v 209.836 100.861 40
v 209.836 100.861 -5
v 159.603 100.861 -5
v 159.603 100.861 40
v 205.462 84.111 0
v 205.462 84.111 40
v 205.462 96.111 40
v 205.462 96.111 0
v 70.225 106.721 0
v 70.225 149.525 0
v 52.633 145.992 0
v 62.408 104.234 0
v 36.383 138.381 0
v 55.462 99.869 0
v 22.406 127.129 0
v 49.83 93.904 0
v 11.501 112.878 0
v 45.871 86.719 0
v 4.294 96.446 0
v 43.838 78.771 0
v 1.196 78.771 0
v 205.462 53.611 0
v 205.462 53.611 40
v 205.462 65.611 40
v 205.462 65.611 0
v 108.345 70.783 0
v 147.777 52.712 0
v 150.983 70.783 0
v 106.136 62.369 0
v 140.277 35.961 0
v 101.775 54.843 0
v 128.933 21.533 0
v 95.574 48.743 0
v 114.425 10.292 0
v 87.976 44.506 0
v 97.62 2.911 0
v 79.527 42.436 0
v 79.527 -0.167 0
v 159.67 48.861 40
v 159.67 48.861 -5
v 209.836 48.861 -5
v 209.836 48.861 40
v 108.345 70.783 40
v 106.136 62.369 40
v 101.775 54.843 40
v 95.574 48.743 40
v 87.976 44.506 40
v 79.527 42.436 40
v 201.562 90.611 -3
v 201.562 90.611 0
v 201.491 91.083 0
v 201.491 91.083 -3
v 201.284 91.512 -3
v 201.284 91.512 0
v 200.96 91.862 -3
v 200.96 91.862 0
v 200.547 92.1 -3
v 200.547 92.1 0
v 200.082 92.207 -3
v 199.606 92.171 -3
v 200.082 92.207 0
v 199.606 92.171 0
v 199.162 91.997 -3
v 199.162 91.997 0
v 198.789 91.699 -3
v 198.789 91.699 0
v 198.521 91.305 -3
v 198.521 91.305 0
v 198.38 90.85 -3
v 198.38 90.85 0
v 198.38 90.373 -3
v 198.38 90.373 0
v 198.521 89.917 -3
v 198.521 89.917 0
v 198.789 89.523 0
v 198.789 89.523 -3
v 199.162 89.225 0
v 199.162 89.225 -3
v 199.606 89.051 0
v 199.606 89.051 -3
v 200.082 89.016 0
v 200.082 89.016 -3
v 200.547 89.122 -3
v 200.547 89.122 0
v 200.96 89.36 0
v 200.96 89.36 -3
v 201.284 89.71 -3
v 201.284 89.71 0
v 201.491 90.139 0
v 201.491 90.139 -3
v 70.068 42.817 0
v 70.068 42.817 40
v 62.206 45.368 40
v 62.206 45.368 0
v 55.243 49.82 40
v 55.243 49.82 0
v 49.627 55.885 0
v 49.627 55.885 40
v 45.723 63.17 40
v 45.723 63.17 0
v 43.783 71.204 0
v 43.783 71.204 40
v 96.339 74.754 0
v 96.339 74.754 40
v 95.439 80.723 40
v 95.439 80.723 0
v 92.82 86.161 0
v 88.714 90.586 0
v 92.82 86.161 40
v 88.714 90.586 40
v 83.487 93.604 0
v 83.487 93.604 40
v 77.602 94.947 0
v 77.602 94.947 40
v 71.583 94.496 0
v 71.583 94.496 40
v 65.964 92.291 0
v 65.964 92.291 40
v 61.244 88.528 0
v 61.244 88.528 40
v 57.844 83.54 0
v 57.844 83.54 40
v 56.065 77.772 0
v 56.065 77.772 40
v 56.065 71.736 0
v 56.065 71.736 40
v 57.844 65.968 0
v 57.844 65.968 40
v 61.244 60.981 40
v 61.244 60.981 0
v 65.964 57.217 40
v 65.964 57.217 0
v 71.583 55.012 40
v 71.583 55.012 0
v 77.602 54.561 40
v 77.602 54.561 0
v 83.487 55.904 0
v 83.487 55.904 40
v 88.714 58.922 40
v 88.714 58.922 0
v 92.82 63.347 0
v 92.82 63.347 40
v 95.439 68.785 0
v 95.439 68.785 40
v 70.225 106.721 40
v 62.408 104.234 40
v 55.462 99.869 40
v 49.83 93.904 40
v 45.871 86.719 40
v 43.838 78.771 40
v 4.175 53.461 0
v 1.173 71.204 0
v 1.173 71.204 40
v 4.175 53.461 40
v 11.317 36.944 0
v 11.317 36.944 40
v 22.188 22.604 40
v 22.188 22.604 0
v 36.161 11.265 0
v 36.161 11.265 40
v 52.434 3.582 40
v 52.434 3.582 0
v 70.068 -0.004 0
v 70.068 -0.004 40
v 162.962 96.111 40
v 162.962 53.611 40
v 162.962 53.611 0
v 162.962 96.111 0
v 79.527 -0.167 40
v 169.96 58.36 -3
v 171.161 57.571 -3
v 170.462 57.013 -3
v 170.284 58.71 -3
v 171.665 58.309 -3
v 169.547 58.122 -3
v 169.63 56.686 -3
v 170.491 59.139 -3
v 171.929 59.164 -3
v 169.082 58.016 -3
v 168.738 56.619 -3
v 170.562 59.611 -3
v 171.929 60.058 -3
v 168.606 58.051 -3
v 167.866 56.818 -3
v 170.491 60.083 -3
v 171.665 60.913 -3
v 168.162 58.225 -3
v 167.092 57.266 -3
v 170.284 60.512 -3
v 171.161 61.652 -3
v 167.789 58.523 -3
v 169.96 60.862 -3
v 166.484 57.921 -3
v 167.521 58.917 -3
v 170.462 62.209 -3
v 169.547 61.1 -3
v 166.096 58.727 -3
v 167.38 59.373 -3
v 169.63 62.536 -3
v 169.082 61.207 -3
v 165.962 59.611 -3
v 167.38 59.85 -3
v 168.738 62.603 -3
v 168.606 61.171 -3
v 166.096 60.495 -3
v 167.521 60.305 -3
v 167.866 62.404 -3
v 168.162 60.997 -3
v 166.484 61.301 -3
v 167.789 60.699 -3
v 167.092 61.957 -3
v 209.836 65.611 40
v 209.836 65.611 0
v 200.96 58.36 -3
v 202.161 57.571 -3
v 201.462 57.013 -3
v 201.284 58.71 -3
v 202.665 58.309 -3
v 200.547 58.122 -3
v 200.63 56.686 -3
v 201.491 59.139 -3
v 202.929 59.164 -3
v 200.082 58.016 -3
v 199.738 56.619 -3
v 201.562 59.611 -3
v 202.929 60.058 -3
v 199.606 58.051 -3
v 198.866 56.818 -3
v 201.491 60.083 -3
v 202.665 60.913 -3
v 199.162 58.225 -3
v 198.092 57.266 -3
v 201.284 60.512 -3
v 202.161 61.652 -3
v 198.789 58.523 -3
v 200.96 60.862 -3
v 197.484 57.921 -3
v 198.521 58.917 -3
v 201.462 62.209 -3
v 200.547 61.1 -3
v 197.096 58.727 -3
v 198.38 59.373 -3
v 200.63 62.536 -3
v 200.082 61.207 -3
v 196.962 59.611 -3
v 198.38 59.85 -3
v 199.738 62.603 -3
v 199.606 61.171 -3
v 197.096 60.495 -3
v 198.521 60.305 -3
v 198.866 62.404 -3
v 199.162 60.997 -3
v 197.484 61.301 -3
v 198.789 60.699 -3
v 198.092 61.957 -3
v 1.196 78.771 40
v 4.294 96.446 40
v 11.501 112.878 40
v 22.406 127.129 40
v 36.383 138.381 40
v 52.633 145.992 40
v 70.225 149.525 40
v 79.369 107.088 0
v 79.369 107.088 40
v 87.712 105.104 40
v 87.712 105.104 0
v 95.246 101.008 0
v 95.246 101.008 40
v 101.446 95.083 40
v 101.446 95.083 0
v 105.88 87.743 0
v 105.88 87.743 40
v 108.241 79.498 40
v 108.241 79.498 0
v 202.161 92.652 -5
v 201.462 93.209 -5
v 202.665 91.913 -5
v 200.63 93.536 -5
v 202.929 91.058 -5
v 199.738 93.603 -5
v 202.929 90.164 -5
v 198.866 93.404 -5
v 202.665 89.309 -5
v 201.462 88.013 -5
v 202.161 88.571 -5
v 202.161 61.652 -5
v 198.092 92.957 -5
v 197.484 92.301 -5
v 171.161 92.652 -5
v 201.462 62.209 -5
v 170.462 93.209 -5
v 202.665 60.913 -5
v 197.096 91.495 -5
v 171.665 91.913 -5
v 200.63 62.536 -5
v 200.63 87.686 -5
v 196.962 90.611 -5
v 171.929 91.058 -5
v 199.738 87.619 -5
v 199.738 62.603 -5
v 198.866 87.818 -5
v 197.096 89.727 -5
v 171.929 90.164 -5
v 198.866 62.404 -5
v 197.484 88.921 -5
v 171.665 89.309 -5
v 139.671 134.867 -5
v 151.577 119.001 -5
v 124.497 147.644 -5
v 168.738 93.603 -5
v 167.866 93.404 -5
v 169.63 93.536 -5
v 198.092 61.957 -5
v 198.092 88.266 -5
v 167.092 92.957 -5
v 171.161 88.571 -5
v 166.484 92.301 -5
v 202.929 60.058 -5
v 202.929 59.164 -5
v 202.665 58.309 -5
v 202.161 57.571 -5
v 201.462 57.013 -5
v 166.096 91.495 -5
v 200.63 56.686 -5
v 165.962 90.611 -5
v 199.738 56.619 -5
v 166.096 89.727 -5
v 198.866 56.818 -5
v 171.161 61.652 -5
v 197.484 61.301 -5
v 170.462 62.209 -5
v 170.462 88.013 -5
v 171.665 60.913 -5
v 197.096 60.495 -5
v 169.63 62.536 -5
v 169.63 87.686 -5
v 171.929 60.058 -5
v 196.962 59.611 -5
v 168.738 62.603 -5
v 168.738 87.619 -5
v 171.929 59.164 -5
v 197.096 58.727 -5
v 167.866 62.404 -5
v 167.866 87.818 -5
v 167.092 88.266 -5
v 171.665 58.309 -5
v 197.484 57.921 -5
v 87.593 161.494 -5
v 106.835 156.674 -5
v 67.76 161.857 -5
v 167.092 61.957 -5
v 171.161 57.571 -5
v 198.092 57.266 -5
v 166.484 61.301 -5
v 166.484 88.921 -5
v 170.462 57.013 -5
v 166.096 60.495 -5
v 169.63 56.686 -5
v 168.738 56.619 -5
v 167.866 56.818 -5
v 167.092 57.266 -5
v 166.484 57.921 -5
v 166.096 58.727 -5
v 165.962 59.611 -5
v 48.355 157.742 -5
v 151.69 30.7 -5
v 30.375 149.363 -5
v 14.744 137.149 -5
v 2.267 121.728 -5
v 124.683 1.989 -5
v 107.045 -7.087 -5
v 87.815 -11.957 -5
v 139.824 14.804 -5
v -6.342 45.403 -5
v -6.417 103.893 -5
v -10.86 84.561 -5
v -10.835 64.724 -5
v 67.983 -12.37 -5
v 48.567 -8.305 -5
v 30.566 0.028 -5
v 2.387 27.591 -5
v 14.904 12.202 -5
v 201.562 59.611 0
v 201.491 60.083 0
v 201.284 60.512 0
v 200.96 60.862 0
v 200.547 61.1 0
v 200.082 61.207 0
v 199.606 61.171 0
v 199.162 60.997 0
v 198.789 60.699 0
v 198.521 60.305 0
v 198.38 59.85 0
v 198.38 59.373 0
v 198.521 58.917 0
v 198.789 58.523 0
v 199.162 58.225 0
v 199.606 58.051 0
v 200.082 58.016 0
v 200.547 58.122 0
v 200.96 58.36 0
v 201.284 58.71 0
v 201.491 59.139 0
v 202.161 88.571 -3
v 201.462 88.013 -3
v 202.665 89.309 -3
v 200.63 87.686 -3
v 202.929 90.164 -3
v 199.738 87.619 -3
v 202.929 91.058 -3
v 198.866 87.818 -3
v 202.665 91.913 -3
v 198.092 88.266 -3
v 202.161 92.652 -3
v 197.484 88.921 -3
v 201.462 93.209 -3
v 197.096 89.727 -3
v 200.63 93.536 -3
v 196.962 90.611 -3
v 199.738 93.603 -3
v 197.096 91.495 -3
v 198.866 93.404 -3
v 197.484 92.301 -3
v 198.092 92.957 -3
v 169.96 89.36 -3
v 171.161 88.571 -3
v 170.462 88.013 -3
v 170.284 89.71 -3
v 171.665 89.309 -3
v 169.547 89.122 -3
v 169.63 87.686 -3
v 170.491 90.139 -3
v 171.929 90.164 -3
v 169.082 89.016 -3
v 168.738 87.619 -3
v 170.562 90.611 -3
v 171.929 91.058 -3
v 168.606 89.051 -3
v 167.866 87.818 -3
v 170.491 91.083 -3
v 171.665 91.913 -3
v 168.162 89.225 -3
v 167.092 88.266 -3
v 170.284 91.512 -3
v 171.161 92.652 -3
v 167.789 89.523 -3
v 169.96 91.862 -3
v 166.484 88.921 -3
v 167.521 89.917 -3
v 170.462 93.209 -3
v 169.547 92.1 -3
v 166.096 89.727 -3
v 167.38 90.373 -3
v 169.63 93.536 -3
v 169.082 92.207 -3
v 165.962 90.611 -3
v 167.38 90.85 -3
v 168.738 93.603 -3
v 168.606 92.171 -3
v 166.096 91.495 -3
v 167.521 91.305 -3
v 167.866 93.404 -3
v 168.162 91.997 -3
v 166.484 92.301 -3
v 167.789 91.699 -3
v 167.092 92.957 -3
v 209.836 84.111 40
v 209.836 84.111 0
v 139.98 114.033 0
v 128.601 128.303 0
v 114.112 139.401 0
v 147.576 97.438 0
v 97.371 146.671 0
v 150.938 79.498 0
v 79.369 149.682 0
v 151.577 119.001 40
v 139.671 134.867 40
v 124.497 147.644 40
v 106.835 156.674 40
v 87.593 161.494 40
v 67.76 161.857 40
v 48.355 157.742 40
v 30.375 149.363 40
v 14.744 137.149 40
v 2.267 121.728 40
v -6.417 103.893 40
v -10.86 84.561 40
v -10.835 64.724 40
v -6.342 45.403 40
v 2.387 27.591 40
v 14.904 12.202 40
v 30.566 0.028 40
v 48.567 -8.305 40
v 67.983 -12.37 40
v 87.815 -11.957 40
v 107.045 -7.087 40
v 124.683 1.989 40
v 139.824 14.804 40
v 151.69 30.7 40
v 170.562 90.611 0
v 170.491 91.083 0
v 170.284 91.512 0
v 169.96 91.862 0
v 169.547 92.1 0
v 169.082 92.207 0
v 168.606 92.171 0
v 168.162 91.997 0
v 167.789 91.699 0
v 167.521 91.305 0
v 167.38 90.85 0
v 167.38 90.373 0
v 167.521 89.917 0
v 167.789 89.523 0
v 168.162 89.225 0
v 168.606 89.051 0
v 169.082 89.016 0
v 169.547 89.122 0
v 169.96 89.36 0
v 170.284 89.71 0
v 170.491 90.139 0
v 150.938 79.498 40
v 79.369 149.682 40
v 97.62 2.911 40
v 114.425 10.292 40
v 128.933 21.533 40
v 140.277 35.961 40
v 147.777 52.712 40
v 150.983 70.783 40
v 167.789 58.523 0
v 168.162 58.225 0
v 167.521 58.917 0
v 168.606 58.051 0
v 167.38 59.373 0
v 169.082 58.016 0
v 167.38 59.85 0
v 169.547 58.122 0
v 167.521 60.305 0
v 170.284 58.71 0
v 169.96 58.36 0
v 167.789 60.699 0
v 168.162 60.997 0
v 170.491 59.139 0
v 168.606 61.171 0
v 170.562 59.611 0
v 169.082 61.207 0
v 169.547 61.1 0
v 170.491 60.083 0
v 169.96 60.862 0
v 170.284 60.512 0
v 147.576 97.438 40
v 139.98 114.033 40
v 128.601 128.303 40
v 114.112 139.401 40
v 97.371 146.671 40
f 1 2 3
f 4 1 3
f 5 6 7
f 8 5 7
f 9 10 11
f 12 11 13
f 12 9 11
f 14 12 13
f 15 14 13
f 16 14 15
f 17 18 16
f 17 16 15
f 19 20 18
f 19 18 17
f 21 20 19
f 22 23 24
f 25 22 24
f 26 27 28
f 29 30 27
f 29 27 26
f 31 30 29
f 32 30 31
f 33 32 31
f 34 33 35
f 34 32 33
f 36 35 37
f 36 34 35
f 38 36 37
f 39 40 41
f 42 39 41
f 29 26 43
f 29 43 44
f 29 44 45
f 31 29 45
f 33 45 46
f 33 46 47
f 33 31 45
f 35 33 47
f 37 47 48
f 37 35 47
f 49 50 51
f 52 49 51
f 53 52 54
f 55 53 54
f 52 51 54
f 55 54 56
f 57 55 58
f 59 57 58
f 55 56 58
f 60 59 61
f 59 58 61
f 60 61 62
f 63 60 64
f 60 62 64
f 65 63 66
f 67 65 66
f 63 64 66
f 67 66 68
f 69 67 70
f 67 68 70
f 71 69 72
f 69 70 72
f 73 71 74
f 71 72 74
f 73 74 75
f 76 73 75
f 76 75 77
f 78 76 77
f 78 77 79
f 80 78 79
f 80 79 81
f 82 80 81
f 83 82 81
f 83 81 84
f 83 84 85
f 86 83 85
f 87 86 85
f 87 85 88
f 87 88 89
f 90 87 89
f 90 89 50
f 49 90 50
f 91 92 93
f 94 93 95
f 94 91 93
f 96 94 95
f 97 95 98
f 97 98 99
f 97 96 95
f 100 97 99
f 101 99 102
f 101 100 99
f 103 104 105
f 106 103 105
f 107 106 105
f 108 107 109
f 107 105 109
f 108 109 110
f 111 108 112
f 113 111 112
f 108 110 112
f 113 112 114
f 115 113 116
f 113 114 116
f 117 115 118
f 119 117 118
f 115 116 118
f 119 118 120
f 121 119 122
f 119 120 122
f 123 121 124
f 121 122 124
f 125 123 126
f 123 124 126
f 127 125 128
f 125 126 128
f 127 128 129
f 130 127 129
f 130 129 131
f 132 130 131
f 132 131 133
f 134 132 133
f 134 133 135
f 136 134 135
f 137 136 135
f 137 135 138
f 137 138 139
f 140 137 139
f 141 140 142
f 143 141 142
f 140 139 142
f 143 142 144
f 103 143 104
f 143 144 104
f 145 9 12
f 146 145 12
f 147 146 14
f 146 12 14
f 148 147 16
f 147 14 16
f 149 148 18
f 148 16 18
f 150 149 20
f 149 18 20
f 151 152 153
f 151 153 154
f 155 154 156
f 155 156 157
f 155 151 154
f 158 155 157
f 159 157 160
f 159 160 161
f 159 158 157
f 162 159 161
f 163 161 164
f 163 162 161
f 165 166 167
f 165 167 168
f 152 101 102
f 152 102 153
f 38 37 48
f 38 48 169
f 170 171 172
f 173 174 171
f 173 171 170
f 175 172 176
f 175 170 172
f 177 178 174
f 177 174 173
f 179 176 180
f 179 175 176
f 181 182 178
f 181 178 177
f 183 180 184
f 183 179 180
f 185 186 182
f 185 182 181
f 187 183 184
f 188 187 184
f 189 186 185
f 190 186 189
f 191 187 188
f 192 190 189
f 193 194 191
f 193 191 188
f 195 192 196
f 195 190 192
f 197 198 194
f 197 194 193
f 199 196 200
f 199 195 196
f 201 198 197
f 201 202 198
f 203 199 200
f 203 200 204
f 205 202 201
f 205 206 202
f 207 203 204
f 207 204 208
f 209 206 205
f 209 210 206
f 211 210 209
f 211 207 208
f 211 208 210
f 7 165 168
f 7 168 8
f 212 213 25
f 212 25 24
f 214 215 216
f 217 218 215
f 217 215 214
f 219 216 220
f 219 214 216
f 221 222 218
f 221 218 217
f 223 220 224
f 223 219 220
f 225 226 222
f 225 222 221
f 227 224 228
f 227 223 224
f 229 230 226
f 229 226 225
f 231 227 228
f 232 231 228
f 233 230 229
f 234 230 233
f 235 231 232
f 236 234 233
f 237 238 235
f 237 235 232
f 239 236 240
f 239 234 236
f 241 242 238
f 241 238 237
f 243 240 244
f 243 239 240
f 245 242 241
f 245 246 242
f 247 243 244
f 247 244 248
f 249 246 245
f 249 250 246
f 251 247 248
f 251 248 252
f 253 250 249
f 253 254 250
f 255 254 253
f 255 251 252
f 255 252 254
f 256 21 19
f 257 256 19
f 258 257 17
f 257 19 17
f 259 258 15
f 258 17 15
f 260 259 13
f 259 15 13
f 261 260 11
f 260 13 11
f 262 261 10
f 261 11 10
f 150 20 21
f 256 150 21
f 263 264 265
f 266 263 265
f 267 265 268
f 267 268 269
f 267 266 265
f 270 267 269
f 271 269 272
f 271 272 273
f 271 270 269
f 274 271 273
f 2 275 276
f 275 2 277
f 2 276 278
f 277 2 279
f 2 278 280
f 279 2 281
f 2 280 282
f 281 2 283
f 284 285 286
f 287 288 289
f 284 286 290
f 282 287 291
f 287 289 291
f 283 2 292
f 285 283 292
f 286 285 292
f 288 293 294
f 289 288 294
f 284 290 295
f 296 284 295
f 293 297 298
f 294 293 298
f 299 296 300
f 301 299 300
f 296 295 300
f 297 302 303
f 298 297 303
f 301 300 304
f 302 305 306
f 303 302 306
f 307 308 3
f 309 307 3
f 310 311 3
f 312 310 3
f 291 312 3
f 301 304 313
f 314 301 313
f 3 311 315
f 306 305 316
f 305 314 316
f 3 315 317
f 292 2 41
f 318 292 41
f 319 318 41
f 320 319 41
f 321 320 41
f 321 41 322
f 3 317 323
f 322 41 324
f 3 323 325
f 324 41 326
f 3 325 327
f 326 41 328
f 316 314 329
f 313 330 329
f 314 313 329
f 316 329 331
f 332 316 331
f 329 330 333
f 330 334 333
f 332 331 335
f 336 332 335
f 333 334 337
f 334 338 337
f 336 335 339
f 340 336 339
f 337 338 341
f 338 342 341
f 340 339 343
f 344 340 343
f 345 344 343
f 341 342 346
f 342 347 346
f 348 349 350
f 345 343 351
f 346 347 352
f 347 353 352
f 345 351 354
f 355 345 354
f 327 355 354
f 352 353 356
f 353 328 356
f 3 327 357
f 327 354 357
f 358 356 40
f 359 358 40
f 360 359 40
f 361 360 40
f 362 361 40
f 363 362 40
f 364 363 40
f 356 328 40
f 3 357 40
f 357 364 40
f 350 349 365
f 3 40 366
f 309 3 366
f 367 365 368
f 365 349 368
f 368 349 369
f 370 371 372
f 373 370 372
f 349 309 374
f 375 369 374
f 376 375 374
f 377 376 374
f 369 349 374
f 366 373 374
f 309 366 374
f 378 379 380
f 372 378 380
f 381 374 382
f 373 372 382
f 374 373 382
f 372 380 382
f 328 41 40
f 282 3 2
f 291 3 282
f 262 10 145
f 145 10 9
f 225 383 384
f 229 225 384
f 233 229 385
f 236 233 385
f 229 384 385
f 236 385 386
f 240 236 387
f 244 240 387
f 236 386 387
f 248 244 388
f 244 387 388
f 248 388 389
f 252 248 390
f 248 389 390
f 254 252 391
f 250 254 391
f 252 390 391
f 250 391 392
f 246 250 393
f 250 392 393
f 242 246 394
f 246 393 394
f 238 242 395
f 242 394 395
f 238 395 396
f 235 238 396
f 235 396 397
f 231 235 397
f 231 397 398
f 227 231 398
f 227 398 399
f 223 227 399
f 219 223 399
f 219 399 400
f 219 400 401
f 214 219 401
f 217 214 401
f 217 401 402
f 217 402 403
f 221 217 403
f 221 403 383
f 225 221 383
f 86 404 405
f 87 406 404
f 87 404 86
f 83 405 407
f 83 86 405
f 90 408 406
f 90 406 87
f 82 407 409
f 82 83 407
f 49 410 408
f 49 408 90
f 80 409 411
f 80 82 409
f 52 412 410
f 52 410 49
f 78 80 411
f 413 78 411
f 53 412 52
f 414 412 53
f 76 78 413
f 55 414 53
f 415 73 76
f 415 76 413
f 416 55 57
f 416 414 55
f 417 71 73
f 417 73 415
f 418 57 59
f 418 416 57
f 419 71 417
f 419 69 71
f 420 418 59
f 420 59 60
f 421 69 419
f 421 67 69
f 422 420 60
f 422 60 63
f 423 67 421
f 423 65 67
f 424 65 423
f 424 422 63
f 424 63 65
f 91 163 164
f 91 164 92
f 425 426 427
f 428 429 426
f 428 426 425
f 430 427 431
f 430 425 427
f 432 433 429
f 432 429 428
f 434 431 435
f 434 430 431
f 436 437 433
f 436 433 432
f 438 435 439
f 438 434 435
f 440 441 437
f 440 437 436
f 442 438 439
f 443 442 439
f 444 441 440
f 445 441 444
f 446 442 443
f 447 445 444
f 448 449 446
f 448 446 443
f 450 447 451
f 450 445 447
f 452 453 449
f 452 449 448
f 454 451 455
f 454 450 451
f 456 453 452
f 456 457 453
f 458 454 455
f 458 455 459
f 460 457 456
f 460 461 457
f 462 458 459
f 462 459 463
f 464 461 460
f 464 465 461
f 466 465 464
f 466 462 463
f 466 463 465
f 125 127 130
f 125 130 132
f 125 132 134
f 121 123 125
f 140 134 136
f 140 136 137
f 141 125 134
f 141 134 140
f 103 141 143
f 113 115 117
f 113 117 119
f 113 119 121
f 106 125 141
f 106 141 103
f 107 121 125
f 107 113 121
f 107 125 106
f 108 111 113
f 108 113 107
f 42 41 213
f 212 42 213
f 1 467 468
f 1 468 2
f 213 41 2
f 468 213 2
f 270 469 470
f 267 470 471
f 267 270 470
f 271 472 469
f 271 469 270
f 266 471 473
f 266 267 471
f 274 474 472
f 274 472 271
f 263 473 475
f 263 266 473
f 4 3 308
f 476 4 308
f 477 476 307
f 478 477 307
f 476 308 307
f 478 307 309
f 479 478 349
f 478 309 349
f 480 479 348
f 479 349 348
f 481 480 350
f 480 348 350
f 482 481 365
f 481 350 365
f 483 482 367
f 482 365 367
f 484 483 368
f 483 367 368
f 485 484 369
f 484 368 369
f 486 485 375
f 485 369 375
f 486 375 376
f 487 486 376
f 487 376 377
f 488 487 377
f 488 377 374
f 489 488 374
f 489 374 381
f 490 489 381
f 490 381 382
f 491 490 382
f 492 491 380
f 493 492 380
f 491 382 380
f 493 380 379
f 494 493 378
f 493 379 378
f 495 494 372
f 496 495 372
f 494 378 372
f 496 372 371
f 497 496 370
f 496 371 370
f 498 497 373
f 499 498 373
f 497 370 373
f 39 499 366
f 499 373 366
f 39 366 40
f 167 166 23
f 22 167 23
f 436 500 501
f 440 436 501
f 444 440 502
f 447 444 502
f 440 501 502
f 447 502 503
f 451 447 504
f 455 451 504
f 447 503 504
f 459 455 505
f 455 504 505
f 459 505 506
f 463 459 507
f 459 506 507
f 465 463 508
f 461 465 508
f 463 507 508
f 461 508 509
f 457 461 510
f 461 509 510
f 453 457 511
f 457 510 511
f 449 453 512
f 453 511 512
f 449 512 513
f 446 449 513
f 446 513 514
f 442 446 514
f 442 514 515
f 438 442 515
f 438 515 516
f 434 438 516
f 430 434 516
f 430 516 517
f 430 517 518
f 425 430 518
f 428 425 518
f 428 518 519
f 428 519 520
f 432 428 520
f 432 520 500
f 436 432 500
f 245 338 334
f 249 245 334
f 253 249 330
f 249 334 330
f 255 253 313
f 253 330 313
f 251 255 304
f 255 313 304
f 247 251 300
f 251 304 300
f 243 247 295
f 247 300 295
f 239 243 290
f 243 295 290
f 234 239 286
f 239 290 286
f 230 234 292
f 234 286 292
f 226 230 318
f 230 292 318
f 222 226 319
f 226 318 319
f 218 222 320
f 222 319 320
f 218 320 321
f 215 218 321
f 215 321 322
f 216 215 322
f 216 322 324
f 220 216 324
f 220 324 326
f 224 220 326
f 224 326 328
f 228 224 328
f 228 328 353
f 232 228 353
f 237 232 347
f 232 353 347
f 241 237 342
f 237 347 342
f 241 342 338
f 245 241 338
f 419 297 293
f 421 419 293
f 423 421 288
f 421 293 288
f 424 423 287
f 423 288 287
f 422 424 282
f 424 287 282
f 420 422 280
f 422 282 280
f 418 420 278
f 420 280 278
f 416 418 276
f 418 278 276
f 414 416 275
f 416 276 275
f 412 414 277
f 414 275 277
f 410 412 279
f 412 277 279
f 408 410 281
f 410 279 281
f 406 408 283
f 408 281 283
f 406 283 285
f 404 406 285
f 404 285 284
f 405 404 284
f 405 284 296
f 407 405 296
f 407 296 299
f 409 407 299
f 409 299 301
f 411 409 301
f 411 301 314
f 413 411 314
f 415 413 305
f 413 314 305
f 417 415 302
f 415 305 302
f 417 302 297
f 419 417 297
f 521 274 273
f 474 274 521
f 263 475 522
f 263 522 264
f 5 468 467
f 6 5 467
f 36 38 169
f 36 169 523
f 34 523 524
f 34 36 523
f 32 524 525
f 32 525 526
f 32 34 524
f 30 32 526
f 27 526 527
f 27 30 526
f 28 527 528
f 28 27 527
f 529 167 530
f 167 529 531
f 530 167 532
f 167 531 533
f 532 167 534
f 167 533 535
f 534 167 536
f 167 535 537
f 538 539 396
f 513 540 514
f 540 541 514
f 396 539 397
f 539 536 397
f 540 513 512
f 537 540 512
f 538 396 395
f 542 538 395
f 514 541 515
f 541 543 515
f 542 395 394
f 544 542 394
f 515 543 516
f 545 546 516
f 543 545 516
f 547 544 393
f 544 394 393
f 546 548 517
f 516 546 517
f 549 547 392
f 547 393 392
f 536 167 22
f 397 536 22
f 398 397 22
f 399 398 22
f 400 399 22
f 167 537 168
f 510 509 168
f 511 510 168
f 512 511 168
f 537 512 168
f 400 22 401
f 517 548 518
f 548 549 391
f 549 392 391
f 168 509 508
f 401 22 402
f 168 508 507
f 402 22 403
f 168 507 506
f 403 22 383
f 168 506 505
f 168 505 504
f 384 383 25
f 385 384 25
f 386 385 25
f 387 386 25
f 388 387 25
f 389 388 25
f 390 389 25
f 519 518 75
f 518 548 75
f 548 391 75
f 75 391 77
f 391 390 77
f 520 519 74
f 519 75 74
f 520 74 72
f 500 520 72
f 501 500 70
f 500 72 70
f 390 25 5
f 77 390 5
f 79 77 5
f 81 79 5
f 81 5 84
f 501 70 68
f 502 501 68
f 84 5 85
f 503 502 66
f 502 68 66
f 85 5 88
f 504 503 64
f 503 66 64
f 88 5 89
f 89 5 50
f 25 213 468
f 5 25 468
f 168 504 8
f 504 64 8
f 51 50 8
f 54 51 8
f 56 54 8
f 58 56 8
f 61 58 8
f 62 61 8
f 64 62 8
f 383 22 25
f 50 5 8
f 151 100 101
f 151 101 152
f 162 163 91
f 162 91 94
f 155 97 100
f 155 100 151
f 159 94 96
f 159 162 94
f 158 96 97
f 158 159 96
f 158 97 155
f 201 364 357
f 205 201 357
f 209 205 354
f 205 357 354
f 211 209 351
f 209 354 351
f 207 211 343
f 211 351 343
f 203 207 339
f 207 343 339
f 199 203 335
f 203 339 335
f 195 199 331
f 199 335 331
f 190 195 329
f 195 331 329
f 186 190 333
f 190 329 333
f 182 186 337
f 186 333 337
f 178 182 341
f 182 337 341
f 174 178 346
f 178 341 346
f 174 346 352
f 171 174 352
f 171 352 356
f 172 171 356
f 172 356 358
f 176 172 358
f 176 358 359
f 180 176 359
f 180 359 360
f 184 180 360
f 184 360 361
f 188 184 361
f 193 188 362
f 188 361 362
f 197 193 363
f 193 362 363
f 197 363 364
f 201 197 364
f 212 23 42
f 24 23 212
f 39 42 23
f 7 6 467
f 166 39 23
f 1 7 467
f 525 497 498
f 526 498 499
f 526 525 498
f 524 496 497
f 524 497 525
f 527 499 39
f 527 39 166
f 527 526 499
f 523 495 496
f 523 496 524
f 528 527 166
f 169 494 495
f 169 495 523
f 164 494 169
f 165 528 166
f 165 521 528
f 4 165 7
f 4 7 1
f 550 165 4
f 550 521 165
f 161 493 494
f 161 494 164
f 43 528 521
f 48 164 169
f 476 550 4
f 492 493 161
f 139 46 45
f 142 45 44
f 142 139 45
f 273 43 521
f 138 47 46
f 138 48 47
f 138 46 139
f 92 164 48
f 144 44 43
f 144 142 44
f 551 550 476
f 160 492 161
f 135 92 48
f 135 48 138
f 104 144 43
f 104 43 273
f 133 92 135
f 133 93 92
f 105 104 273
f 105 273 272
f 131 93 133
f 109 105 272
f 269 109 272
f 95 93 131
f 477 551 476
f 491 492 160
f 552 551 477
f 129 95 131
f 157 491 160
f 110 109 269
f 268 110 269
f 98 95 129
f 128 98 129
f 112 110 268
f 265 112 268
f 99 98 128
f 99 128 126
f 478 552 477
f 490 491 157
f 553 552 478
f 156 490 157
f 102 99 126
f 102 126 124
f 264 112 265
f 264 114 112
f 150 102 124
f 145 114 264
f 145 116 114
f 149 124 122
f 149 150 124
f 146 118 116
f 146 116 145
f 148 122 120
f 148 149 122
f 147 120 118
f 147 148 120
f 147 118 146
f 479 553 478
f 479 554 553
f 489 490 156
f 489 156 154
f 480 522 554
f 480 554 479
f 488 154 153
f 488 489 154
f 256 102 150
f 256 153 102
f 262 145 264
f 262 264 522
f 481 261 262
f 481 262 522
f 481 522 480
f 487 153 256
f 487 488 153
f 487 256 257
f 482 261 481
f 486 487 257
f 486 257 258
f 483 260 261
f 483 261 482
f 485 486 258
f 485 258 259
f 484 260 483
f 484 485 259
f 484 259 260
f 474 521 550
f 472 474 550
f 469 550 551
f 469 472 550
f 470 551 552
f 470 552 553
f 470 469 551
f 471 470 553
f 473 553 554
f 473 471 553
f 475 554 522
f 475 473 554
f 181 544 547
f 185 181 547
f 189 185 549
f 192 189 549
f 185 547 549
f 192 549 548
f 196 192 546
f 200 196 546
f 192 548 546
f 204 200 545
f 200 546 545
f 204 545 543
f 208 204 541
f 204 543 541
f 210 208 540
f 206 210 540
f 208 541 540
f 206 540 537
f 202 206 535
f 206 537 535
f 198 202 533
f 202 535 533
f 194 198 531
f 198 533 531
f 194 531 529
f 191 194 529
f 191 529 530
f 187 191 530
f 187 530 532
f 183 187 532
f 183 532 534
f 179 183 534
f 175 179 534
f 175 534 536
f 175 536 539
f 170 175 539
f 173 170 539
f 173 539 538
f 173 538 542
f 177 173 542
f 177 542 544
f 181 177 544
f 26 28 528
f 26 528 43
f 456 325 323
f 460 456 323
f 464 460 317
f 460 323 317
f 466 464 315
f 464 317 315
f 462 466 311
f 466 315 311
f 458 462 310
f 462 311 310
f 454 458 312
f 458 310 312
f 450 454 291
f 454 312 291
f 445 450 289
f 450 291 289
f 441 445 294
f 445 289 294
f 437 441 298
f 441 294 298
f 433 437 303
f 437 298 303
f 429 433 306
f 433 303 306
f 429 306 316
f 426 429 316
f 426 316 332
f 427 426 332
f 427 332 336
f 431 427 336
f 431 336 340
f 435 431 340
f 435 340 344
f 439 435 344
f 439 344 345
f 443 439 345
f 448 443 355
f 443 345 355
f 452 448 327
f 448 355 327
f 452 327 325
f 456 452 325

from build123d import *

# Parameters (mm, degrees)
SKETCH1_R           = 20
BOSS_EXTRUDE4_DEPTH = 40
BOSS_EXTRUDE5_START = 5
BOSS_EXTRUDE5_DEPTH = 5
SKETCH6_R           = 1.25
CUT_EXTRUDE1_DEPTH  = 5
SKETCH7_R           = 3
CUT_EXTRUDE2_DEPTH  = 2
SKETCH8_R           = 20.25
CUT_EXTRUDE3_DEPTH  = 40
SKETCH9_W           = 42.5
SKETCH9_H           = 42.5
CUT_EXTRUDE4_DEPTH  = 40
SKETCH10_W          = 18.5
SKETCH10_H          = 40
CUT_EXTRUDE5_DEPTH  = 7
SKETCH11_R          = 1.6
CUT_EXTRUDE6_DEPTH  = 269.248997311


with BuildPart() as part:
    # Sketch1 → Boss-Extrude4 (new body)
    with BuildSketch(Plane(origin=(0, 0, 0), x_dir=(0, 1, 0), z_dir=(0, 0, 1))):
        with BuildLine():
            Line((48.86109499, -159.669791534), (48.86109499, -209.83599005))
            Line((48.86109499, -209.83599005), (65.86109499, -209.83599005))
            Line((65.86109499, -209.83599005), (65.86109499, -204.83599005))
            Line((65.86109499, -204.83599005), (53.86109499, -204.83599005))
            Line((53.86109499, -204.83599005), (53.86109499, -163.588668859))
            Line((53.86109499, -163.588668859), (95.86109499, -163.588668859))
            Line((95.86109499, -163.588668859), (95.86109499, -204.83599005))
            Line((95.86109499, -204.83599005), (83.86109499, -204.83599005))
            Line((83.86109499, -204.83599005), (83.86109499, -209.83599005))
            Line((83.86109499, -209.83599005), (100.86109499, -209.83599005))
            Line((100.86109499, -209.83599005), (100.86109499, -159.603176712))
            ThreePointArc((100.86109499, -159.603176712), (74.64197355, 11.411259343), (48.86109499, -159.669791534))
        make_face()
        with Locations(Location((74.754065705, -76.088668859, 0), (0, 0, 270))):
            Circle(SKETCH1_R, mode=Mode.SUBTRACT)
        with BuildLine():
            Line((149.524530838, -70.225432227), (106.720805548, -70.225432227))
            ThreePointArc((106.720805548, -70.225432227), (97.065220712, -52.456860586), (78.771338454, -43.837908873))
            Line((78.771338454, -43.837908873), (78.771338454, -1.19633601))
            ThreePointArc((78.771338454, -1.19633601), (127.128973259, -22.405626297), (149.524530838, -70.225432227))
        make_face(mode=Mode.SUBTRACT)
        with BuildLine():
            Line((149.682278397, -79.369361301), (107.088057991, -79.369361301))
            ThreePointArc((107.088057991, -79.369361301), (98.250620194, -98.542219295), (79.498497507, -108.240501884))
            Line((79.498497507, -108.240501884), (79.498497507, -150.938454209))
            ThreePointArc((79.498497507, -150.938454209), (128.302794309, -128.600892817), (149.682278397, -79.369361301))
        make_face(mode=Mode.SUBTRACT)
        with BuildLine():
            Line((70.783231418, -150.983478259), (70.783231418, -108.345179443))
            ThreePointArc((70.783231418, -108.345179443), (51.584378521, -98.879359849), (42.436457903, -79.52701525))
            Line((42.436457903, -79.52701525), (-0.167078, -79.52701525))
            ThreePointArc((-0.167078, -79.52701525), (21.532899104, -128.932849482), (70.783231418, -150.983478259))
        make_face(mode=Mode.SUBTRACT)
        with BuildLine():
            Line((-0.003869503, -70.067778277), (42.816644448, -70.067778277))
            ThreePointArc((42.816644448, -70.067778277), (52.673264417, -52.241484236), (71.203948876, -43.783148116))
            Line((71.203948876, -43.783148116), (71.203948876, -1.172738174))
            ThreePointArc((71.203948876, -1.172738174), (22.603616127, -22.187550051), (-0.003869503, -70.067778277))
        make_face(mode=Mode.SUBTRACT)
    extrude(amount=BOSS_EXTRUDE4_DEPTH)

    # Sketch4 → Boss-Extrude5 (add)
    with BuildSketch(Plane(origin=(0, 0, 0), x_dir=(1, 0, 0), z_dir=(0, 0, -1)).offset(BOSS_EXTRUDE5_START)):
        with BuildLine():
            Line((159.669791534, -48.86109499), (209.83599005, -48.86109499))
            Line((209.83599005, -48.86109499), (209.83599005, -100.86109499))
            Line((209.83599005, -100.86109499), (159.603176712, -100.86109499))
            ThreePointArc((159.603176712, -100.86109499), (-11.411259343, -74.64197355), (159.669791534, -48.86109499))
        make_face()
    extrude(amount=-BOSS_EXTRUDE5_DEPTH)

    # Sketch6 → Cut-Extrude1 (cut)
    with BuildSketch(Plane(origin=(0, 0, -5), x_dir=(1, 0, 0), z_dir=(0, 0, -1))):
        with Locations(Location((199.962329455, -59.61109499, 0), (0, 0, 180))):
            Circle(SKETCH6_R)
        with Locations(Location((168.962329455, -59.61109499, 0), (0, 0, 180))):
            Circle(SKETCH6_R)
        with Locations(Location((168.962329455, -90.61109499, 0), (0, 0, 180))):
            Circle(SKETCH6_R)
        with Locations(Location((199.962329455, -90.61109499, 0), (0, 0, 180))):
            Circle(SKETCH6_R)
    extrude(amount=-CUT_EXTRUDE1_DEPTH, mode=Mode.SUBTRACT)

    # Sketch7 → Cut-Extrude2 (cut)
    with BuildSketch(Plane(origin=(0, 0, -5), x_dir=(-1, 0, 0), z_dir=(0, 0, -1))):
        with Locations((-199.962329455, 59.61109499)):
            Circle(SKETCH7_R)
        with Locations((-168.962329455, 59.61109499)):
            Circle(SKETCH7_R)
        with Locations((-168.962329455, 90.61109499)):
            Circle(SKETCH7_R)
        with Locations((-199.962329455, 90.61109499)):
            Circle(SKETCH7_R)
    extrude(amount=-CUT_EXTRUDE2_DEPTH, mode=Mode.SUBTRACT)

    # Sketch8 → Cut-Extrude3 (cut)
    with BuildSketch(Plane.XY.offset(40)):
        with Locations((76.088668859, 74.754065705)):
            Circle(SKETCH8_R)
    extrude(amount=-CUT_EXTRUDE3_DEPTH, mode=Mode.SUBTRACT)

    # Sketch9 → Cut-Extrude4 (cut)
    with BuildSketch(Plane.XY.offset(40)):
        with Locations((184.212329455, 74.86109499)):
            Rectangle(SKETCH9_W, SKETCH9_H)
    extrude(amount=-CUT_EXTRUDE4_DEPTH, mode=Mode.SUBTRACT)

    # Sketch10 → Cut-Extrude5 (cut)
    with BuildSketch(Plane.YZ.offset(209.83599005)):
        with Locations((74.86109499, 20)):
            Rectangle(SKETCH10_W, SKETCH10_H)
    extrude(amount=-CUT_EXTRUDE5_DEPTH, mode=Mode.SUBTRACT)

    # Sketch11 → Cut-Extrude6 (cut, through all)
    with BuildSketch(Plane.XY):
        with Locations((168.962329455, 90.61109499)):
            Circle(SKETCH11_R)
        with Locations((199.962329455, 90.61109499)):
            Circle(SKETCH11_R)
        with Locations((168.962329455, 59.61109499)):
            Circle(SKETCH11_R)
        with Locations((199.962329455, 59.61109499)):
            Circle(SKETCH11_R)
    extrude(amount=-CUT_EXTRUDE6_DEPTH, mode=Mode.SUBTRACT)


solid = part.part
